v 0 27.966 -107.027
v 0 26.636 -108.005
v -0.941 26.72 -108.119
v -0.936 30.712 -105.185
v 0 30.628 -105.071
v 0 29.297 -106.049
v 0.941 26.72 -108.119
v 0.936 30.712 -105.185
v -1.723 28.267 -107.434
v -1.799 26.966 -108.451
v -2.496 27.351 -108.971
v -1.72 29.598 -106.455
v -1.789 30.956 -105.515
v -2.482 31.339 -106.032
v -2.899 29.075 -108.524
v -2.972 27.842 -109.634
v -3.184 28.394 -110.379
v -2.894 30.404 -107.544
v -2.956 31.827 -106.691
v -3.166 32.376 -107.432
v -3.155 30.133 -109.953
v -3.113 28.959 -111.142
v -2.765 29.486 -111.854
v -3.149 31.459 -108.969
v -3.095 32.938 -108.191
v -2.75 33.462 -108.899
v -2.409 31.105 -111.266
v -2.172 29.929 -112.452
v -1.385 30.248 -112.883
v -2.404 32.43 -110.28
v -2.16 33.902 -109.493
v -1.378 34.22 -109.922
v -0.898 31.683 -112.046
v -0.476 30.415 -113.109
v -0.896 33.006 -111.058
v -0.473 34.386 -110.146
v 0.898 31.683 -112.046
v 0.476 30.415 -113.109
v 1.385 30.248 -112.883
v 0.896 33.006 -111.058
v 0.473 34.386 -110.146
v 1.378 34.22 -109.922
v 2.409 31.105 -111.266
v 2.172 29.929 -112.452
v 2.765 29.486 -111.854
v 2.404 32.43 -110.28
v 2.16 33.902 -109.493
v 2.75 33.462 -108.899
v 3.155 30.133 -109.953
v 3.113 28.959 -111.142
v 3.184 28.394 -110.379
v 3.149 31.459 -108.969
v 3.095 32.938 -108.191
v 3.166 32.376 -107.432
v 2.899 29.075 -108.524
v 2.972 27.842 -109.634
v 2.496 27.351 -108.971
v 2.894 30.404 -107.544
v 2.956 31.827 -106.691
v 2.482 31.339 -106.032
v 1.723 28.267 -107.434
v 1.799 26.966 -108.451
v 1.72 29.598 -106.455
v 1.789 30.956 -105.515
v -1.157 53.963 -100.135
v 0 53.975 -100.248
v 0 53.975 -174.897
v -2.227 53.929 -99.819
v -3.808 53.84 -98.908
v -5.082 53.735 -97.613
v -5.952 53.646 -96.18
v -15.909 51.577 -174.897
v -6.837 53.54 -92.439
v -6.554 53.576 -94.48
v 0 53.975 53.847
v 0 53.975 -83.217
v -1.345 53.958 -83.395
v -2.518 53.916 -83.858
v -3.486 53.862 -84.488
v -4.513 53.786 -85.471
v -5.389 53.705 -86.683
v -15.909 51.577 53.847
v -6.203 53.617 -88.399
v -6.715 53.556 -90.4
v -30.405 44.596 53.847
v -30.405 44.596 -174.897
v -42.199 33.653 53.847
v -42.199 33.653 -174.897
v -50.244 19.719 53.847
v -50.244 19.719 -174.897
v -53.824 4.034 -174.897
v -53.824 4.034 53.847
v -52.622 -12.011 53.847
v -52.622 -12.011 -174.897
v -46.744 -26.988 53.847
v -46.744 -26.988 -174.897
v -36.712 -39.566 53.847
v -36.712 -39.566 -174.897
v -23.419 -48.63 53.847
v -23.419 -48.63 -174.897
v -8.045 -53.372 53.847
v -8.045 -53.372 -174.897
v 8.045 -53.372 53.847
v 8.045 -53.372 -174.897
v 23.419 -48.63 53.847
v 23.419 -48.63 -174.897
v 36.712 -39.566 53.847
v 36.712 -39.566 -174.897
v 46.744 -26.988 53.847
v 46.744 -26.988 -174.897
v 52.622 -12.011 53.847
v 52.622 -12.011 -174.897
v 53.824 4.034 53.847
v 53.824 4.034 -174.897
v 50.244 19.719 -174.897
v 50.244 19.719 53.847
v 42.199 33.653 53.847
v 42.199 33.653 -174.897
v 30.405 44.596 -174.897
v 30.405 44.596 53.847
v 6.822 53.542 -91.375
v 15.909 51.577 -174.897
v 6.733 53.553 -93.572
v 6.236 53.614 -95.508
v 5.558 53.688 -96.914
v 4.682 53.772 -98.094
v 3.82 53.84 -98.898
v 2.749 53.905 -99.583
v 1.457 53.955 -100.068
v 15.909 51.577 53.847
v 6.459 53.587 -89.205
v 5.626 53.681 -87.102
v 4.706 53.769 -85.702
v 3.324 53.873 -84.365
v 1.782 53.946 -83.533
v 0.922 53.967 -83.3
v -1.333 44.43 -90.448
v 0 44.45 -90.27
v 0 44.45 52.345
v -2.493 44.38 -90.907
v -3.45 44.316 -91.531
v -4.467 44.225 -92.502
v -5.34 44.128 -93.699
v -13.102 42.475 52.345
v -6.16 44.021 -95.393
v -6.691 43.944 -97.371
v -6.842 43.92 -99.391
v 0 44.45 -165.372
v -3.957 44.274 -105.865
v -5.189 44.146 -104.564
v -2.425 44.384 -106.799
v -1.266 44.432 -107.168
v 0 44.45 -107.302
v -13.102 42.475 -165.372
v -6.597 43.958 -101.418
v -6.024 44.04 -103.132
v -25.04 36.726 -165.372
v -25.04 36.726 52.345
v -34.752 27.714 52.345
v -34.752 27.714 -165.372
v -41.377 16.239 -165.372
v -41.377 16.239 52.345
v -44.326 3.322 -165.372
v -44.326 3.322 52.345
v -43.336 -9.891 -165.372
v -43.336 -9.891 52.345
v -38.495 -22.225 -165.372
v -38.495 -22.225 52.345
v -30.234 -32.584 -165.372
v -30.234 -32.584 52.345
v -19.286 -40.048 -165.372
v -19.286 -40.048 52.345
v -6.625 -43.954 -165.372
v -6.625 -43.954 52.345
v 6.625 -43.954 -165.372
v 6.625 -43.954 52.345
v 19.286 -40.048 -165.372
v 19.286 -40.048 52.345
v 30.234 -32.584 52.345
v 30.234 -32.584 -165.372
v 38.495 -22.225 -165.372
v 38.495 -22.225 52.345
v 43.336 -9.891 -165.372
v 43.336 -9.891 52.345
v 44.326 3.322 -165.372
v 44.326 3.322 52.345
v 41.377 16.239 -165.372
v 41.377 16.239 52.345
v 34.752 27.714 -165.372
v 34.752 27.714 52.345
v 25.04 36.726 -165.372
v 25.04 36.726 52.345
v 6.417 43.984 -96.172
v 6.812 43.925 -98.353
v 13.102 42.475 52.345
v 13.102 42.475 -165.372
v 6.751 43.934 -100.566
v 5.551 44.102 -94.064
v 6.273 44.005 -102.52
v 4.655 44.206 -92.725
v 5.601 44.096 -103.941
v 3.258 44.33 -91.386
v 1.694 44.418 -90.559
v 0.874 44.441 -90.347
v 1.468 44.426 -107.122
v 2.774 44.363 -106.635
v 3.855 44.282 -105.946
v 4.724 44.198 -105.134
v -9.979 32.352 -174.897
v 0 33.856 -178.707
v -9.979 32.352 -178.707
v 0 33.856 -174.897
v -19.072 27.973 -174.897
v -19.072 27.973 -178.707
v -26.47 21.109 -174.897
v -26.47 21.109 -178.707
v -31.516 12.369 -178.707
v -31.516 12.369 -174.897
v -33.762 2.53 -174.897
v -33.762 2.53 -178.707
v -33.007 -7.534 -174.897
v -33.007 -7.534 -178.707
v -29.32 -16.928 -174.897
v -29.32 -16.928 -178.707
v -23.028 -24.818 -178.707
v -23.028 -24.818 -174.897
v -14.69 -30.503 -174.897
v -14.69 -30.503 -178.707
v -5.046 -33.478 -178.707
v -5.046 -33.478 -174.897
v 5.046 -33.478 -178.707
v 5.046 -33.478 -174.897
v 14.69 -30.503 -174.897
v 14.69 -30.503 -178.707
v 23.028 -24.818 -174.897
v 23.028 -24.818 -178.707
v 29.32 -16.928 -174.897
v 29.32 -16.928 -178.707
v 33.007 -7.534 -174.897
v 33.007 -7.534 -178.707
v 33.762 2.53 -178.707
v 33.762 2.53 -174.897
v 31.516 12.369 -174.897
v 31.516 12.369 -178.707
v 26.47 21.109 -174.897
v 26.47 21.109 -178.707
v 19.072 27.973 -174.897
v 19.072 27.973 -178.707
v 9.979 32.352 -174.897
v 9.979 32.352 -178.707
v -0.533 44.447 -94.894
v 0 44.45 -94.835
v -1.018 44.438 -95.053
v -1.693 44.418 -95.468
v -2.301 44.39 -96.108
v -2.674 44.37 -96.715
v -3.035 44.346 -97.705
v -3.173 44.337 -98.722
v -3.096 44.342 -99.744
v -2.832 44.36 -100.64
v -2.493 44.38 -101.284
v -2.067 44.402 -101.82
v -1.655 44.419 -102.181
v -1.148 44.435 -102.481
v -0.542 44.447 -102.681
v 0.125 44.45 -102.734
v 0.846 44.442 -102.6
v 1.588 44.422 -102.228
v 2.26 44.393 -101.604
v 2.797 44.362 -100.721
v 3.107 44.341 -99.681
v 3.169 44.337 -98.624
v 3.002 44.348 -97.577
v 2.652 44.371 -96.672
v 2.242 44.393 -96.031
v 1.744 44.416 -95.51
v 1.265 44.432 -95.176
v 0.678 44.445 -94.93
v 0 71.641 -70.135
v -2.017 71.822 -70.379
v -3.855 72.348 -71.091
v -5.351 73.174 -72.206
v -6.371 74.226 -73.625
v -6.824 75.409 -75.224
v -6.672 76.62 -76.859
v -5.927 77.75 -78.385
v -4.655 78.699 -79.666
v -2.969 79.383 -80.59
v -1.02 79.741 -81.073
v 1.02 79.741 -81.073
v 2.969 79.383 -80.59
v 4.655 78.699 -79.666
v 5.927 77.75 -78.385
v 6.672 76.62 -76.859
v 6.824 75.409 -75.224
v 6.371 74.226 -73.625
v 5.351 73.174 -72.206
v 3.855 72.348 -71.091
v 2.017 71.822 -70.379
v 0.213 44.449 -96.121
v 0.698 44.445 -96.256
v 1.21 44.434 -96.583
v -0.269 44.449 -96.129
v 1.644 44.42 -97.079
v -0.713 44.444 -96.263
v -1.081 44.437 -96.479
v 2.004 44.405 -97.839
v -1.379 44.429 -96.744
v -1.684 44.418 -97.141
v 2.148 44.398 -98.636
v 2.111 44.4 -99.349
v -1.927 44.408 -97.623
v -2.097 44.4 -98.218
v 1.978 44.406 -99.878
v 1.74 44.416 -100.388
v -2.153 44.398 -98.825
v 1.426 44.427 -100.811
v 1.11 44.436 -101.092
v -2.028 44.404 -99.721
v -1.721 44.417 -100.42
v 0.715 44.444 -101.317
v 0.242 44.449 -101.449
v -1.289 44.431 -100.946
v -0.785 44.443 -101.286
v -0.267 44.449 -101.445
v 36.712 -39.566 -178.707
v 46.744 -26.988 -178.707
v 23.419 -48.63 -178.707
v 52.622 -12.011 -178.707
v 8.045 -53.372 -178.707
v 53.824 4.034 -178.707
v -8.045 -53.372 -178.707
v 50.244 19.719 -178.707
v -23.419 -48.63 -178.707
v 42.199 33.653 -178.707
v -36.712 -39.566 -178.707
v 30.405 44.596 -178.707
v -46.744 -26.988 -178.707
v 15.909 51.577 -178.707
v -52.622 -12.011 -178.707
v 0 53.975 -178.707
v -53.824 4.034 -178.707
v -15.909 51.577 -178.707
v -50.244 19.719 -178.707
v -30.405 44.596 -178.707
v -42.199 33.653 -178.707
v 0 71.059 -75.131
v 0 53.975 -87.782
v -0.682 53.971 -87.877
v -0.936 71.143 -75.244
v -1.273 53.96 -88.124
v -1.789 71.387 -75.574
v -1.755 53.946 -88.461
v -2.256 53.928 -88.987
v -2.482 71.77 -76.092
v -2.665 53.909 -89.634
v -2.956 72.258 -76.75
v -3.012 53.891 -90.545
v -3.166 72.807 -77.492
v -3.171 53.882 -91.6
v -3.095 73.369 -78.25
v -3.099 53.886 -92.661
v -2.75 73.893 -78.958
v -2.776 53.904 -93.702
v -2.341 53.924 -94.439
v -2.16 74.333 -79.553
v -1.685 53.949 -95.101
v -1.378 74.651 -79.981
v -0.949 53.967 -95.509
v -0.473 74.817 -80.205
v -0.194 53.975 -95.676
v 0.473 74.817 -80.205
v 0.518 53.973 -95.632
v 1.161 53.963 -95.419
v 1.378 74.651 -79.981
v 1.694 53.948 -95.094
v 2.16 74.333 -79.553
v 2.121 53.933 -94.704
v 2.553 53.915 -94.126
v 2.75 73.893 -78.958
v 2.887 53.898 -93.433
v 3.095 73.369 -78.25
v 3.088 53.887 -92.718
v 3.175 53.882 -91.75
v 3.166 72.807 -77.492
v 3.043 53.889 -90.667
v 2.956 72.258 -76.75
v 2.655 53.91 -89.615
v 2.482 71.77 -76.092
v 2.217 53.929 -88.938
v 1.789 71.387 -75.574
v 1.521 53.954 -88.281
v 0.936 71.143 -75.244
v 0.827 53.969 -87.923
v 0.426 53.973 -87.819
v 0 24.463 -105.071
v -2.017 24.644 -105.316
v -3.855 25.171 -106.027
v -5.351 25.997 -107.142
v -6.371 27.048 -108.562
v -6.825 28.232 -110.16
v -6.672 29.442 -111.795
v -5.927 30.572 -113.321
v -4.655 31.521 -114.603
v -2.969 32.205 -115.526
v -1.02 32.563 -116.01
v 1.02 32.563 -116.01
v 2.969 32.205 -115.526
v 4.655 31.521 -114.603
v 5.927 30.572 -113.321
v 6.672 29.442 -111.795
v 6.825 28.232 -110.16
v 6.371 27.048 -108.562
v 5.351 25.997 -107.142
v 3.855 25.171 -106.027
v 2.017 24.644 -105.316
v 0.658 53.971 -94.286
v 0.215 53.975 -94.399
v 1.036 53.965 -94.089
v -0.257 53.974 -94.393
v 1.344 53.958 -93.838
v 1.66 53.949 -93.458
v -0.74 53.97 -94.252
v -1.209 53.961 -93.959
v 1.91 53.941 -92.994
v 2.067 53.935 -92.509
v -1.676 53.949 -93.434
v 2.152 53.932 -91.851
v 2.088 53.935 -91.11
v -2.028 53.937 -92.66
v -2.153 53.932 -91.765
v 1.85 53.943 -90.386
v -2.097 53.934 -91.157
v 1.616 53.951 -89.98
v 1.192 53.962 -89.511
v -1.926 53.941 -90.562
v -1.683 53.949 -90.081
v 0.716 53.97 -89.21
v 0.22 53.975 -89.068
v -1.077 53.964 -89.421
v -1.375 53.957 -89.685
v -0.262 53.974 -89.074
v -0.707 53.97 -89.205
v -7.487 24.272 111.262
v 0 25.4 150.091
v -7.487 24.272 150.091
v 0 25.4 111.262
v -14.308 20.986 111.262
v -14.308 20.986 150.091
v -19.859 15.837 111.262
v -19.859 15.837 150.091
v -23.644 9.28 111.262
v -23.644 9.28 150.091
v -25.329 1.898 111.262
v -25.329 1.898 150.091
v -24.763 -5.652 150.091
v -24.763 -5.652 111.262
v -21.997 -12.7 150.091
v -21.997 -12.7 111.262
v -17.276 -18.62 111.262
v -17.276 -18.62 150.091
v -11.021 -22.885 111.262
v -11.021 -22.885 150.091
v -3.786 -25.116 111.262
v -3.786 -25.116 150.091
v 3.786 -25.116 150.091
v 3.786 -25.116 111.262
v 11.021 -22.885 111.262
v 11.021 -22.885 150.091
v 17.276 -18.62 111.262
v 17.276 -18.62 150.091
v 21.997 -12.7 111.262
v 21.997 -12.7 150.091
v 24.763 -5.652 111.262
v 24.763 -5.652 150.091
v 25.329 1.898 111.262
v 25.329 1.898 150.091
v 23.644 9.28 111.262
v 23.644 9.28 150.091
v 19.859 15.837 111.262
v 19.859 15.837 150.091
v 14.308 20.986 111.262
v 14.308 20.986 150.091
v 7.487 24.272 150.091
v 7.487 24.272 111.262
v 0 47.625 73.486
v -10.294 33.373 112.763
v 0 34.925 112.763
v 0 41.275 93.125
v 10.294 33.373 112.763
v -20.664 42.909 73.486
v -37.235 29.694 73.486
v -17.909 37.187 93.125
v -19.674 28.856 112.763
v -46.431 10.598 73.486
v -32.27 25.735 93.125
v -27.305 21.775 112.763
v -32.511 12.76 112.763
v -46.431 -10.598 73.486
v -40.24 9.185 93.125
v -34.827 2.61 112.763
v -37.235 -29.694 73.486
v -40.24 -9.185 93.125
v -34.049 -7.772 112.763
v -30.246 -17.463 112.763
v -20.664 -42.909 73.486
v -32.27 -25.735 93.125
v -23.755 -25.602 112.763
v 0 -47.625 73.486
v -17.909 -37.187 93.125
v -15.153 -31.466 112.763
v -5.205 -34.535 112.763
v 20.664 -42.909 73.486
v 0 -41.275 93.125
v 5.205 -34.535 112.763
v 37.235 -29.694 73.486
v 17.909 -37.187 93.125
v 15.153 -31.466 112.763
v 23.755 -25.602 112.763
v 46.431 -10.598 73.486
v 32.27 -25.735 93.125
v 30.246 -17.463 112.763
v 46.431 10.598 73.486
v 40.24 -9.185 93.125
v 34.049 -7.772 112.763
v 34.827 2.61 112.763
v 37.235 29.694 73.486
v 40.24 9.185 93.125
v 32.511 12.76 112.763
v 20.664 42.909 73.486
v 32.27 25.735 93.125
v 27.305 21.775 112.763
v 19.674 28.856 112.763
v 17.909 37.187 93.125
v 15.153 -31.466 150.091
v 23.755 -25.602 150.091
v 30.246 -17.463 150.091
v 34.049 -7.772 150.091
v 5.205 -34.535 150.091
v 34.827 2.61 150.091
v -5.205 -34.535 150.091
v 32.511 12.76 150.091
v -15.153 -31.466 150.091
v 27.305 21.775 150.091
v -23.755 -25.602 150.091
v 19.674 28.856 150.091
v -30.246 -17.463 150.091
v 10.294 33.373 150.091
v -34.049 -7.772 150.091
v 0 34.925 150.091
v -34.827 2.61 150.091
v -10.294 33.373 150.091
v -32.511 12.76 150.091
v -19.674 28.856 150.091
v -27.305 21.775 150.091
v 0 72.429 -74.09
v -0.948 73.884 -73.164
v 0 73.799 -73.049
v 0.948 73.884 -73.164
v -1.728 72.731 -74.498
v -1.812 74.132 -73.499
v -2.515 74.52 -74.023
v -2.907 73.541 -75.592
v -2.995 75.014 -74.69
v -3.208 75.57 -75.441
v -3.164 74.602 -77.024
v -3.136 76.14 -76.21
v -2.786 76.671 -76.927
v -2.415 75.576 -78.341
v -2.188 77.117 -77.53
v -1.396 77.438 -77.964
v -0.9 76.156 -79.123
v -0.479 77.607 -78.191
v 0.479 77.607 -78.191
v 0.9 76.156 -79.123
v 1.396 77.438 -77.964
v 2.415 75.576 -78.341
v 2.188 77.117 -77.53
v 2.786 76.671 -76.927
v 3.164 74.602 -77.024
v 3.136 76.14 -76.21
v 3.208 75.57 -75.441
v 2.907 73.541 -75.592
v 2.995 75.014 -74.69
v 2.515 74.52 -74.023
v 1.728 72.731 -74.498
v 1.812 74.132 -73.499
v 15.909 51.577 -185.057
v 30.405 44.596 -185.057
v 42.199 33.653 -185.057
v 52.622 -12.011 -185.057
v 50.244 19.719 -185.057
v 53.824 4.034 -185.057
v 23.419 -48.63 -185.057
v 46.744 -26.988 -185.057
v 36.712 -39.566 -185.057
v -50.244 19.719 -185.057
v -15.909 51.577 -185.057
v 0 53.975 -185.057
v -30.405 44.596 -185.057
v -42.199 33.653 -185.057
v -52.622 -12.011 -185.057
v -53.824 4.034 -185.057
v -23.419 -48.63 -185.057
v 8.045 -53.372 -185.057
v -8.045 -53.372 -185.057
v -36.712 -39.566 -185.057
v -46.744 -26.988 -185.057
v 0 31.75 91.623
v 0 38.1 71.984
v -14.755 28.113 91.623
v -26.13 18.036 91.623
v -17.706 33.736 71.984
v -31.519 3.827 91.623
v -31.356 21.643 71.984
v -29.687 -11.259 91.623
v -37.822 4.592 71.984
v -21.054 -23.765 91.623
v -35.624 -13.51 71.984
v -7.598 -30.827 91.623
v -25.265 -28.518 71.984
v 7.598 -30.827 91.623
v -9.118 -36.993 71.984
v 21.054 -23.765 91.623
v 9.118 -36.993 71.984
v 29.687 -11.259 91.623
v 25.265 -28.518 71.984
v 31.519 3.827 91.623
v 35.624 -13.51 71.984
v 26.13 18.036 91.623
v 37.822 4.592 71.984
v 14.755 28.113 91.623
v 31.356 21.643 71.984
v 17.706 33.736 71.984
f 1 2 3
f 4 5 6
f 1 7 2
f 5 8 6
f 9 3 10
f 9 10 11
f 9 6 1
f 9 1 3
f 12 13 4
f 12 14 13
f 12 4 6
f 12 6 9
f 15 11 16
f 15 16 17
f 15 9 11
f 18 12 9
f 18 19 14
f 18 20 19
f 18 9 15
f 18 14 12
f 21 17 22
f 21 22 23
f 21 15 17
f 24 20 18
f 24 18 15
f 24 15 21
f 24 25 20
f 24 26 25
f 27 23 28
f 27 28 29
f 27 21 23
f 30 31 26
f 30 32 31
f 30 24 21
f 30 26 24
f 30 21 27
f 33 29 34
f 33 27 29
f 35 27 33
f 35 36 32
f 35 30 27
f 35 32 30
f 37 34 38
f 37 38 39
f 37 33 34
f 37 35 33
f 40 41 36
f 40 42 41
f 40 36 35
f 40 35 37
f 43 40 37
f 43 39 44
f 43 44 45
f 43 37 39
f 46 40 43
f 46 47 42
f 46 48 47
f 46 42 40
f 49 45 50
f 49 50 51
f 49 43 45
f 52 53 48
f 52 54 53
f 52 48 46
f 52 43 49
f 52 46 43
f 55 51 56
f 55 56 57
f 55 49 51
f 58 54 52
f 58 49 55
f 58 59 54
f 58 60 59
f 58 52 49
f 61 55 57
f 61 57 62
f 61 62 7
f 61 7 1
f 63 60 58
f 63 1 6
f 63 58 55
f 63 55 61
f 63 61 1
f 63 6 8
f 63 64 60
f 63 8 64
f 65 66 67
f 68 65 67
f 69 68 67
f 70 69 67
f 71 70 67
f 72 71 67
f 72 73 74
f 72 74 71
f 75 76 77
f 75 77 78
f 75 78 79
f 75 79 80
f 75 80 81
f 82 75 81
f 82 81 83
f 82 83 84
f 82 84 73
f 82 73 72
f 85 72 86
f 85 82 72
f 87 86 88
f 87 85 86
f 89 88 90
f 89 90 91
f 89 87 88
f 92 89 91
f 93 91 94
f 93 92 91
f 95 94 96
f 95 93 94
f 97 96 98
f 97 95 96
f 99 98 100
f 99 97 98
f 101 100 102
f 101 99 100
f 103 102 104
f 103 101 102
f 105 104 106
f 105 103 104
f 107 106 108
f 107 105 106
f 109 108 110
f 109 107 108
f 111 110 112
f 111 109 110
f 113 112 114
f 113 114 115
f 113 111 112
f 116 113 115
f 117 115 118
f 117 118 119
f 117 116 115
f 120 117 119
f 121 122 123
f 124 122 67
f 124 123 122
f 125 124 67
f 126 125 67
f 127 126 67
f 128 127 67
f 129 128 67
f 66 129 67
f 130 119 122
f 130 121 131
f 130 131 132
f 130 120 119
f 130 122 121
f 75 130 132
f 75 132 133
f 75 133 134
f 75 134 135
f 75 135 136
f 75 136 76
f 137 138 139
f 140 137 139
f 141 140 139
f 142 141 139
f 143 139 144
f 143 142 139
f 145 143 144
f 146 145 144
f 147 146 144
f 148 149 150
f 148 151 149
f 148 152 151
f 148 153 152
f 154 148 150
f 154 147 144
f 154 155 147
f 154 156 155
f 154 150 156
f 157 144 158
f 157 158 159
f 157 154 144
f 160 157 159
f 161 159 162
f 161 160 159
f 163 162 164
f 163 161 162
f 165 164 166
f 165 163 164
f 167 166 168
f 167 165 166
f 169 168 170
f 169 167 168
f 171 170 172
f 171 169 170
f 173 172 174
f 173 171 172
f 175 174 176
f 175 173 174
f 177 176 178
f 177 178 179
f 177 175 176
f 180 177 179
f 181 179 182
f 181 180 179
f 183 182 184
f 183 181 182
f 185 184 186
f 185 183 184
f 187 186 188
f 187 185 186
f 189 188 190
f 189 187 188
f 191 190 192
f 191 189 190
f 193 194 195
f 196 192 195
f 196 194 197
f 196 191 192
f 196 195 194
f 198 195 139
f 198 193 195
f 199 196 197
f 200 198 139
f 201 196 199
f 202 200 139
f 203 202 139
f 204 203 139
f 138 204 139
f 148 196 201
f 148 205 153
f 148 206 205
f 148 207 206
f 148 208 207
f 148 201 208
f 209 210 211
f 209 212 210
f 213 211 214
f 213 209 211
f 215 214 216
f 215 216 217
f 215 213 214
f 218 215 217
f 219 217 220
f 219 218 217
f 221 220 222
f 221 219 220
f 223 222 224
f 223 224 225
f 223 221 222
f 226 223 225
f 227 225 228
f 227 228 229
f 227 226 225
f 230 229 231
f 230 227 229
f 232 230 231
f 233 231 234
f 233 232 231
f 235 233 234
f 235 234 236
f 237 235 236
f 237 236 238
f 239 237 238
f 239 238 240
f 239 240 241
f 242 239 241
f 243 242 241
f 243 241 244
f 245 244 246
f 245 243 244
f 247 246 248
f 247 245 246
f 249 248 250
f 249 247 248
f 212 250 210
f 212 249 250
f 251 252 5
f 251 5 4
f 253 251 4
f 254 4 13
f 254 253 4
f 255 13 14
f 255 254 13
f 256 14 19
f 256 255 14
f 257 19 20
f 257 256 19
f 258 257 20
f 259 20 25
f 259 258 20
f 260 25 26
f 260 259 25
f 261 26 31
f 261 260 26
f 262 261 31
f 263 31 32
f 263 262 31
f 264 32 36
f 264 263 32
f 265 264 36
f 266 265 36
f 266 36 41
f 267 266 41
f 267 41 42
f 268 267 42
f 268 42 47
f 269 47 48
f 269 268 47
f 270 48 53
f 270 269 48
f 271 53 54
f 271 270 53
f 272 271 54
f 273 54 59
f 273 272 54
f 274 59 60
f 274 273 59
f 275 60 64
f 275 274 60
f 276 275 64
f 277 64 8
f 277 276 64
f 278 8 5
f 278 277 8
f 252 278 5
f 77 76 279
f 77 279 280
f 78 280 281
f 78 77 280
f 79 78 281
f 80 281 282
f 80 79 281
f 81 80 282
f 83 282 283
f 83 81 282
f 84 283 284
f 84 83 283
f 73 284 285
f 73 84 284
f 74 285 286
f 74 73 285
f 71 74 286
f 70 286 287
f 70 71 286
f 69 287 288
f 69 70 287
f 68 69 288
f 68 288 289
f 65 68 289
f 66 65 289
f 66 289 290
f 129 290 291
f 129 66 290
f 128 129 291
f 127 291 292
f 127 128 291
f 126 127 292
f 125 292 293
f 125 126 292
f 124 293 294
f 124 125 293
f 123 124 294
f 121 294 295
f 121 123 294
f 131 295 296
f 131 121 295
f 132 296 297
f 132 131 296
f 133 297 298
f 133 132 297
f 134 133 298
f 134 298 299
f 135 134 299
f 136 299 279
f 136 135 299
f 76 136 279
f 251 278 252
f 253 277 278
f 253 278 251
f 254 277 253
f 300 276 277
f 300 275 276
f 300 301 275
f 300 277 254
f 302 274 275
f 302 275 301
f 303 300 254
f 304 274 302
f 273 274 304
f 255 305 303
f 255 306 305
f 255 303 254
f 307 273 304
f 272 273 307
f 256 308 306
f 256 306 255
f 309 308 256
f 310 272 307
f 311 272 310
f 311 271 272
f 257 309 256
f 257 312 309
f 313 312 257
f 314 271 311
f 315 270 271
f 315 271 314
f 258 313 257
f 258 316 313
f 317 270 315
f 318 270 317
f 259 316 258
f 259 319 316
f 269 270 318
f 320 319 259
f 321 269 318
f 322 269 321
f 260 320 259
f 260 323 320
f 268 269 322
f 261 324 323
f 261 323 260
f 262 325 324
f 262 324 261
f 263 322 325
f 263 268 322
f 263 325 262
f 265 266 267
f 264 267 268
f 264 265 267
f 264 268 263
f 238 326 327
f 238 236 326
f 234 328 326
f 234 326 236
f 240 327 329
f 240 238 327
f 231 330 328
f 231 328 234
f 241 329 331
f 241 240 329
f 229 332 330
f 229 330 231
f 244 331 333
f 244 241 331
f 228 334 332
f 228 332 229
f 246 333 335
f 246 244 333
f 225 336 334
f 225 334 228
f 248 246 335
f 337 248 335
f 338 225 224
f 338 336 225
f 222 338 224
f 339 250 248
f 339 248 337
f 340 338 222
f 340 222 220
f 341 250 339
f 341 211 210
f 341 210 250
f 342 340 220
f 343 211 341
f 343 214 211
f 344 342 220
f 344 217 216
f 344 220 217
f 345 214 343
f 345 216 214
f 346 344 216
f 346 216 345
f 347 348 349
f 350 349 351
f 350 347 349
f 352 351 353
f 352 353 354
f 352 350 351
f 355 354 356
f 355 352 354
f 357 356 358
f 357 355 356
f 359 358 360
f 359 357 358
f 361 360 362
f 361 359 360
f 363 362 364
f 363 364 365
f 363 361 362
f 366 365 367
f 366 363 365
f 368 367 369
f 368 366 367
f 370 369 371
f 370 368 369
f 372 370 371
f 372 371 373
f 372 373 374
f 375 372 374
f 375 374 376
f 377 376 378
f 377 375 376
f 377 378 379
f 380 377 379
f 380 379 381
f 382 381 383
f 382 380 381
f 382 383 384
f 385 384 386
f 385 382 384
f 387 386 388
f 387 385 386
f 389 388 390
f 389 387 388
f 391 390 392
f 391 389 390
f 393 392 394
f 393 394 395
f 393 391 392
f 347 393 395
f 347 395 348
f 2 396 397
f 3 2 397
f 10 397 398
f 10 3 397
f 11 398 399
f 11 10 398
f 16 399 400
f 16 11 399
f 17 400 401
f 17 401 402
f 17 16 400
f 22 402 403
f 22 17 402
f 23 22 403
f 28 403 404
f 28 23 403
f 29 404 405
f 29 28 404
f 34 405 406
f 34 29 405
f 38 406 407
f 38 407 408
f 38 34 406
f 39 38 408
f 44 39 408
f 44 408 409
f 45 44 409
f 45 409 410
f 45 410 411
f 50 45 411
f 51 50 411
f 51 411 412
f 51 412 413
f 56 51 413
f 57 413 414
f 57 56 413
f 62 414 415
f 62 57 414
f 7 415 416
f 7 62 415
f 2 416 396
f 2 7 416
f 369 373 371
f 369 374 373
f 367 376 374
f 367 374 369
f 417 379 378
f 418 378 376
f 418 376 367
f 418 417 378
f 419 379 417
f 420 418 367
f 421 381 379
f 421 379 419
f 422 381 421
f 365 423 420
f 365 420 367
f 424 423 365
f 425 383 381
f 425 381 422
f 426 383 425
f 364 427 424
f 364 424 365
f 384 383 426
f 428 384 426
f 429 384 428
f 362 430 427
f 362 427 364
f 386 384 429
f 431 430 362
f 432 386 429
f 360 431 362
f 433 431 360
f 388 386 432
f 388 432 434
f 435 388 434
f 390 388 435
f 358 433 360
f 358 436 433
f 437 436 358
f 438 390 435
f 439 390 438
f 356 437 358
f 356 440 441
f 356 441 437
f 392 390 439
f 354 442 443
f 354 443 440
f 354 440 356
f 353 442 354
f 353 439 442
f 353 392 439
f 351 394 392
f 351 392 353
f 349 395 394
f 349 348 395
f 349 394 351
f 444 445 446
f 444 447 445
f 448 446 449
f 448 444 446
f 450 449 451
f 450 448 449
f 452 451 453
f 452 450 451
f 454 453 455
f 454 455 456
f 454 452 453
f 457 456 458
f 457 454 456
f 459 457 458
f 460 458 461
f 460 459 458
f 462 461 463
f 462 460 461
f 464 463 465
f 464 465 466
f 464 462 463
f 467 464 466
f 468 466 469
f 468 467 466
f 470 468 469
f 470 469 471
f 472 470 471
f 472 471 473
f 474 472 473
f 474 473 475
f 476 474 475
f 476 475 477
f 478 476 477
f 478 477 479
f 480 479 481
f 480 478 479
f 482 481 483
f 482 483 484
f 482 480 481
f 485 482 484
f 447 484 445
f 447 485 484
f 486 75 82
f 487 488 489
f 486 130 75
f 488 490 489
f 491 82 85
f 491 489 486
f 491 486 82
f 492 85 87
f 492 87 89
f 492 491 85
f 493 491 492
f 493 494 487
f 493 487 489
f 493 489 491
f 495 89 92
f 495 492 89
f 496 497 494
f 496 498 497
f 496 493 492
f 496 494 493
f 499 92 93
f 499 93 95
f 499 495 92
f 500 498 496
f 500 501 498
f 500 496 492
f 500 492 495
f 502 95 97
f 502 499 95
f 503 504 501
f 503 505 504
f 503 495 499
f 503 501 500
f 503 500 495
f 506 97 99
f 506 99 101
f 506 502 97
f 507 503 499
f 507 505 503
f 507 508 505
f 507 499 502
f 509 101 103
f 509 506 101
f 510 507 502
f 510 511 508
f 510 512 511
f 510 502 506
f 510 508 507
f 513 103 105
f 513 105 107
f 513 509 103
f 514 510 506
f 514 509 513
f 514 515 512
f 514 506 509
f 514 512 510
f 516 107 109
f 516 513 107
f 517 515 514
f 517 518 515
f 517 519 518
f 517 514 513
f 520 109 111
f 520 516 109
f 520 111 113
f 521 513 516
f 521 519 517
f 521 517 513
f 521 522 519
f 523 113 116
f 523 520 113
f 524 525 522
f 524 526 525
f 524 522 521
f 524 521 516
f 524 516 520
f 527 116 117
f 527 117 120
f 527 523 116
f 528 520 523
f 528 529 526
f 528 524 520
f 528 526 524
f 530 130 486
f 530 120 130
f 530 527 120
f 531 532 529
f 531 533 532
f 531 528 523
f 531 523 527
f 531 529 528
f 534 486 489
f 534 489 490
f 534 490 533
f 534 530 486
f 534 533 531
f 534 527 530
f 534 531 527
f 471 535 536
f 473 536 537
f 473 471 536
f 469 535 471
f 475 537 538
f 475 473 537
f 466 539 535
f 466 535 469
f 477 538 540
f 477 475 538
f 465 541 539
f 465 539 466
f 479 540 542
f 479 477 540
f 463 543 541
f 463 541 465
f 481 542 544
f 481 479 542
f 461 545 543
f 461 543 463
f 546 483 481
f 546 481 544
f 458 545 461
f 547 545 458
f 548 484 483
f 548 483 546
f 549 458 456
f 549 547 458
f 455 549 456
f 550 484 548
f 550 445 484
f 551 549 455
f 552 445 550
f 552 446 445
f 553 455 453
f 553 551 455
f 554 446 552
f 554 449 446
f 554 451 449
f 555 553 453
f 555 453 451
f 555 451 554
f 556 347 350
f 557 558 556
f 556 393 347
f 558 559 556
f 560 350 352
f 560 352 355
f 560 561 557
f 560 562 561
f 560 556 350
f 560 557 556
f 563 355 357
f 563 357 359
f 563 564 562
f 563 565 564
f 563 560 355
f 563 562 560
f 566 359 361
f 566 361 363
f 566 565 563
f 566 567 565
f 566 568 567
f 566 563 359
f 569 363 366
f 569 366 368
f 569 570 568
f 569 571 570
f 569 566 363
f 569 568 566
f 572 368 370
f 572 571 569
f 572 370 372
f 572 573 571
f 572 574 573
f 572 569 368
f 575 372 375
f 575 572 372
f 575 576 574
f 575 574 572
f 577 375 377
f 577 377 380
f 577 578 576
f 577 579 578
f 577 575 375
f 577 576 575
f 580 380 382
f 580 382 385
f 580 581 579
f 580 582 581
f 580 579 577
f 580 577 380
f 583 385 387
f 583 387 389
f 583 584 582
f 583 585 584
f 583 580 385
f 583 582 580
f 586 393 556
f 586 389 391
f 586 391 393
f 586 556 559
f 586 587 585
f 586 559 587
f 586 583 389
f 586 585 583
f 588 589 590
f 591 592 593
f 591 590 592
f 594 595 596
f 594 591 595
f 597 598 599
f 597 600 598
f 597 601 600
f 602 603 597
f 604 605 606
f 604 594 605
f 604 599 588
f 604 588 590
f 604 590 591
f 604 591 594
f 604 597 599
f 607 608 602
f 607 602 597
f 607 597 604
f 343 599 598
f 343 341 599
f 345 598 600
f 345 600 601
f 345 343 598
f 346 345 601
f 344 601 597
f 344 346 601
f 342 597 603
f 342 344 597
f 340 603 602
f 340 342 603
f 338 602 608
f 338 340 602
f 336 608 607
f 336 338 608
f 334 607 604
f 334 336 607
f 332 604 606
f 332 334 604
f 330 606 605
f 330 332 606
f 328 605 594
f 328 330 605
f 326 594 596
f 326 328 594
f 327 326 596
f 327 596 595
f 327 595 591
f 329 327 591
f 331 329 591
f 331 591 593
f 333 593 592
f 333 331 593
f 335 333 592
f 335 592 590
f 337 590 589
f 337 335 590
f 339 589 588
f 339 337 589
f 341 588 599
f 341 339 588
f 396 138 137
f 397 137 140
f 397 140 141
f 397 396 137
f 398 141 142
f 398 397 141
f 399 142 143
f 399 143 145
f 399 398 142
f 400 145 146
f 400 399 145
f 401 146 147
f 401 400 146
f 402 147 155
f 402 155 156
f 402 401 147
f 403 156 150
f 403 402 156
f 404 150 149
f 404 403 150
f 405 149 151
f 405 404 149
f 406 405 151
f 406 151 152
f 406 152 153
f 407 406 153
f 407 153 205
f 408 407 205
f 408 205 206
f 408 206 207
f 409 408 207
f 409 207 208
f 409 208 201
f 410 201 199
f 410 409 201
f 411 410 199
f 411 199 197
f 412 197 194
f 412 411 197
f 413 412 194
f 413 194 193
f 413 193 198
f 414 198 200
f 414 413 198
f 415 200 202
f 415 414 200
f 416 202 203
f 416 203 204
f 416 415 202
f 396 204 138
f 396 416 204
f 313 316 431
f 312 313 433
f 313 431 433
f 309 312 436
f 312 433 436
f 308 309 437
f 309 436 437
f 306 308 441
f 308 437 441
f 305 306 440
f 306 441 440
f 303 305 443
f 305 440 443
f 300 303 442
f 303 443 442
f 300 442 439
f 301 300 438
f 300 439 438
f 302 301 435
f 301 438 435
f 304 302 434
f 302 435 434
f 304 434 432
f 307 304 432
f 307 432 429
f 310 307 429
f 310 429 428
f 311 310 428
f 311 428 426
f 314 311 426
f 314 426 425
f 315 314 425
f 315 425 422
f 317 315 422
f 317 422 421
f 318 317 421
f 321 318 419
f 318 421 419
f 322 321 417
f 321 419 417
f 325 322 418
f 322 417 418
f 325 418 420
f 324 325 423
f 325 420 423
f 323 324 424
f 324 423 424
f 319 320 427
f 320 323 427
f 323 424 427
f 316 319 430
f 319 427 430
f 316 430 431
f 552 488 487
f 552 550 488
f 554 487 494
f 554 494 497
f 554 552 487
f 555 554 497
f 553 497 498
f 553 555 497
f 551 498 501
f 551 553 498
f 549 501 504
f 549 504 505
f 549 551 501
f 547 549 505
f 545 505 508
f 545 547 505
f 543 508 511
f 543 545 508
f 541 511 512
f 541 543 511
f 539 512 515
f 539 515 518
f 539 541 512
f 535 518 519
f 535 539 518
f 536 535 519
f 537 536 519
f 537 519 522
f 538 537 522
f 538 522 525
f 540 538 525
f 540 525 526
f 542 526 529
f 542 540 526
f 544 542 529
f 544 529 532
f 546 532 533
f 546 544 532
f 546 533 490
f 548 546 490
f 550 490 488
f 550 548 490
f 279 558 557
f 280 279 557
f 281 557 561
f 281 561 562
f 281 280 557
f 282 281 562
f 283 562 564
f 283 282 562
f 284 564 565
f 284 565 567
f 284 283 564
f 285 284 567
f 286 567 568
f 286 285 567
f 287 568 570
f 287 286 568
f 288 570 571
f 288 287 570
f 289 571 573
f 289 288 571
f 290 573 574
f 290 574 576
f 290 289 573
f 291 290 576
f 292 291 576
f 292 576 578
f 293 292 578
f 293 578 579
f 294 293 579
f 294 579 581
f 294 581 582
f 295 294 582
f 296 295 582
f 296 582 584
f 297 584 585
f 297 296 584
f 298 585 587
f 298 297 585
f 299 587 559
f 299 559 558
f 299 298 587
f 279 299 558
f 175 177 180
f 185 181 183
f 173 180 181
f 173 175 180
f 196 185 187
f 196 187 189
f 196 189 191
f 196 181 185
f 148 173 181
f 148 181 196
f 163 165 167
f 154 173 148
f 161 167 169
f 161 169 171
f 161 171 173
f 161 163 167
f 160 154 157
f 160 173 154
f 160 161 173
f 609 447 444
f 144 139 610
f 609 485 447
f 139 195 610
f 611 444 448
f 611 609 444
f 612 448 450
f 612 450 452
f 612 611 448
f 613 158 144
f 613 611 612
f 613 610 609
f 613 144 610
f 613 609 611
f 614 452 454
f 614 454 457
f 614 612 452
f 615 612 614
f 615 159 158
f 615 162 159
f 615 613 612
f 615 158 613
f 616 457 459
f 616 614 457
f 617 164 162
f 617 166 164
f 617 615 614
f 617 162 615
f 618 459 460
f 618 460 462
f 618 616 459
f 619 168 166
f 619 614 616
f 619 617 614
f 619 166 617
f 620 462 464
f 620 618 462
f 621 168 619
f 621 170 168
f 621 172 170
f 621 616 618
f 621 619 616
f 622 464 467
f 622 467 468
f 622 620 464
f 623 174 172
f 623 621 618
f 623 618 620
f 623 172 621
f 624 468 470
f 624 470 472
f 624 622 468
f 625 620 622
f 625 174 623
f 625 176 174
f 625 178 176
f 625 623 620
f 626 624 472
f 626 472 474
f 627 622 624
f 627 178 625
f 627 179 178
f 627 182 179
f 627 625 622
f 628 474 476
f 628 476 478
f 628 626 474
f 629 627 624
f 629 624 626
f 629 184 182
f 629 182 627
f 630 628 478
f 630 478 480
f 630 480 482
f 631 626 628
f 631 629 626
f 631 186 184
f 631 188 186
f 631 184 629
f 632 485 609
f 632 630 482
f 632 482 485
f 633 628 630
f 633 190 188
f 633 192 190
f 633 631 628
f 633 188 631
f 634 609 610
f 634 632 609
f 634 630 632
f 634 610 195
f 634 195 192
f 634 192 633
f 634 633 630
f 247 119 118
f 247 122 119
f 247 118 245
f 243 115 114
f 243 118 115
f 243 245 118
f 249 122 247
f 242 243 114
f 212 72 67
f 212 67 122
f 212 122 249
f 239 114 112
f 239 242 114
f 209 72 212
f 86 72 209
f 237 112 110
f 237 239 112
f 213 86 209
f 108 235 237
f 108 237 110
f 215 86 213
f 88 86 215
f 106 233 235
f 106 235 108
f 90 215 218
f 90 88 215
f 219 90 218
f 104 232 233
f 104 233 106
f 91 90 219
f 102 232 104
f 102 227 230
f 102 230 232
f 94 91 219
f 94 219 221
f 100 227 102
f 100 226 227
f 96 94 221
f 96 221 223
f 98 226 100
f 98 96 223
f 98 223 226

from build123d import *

# Parameters (mm, degrees)
F4_R     = 2.152954
F5_DEPTH = 50.8


with BuildPart() as f1:
    # F0 (on Right) → F1 (revolve)
    with BuildSketch(Plane.YZ):
        Polygon((0, -174.897112), (0, -185.057112), (53.975, -185.057112), (53.975, -178.707112), (33.856217, -178.707112), (33.856217, -174.897112), align=None)
        Polygon((0, -165.372112), (0, -174.897112), (33.856217, -174.897112), (44.45, -165.372112), align=None)
        Polygon((44.45, -165.372112), (33.856217, -174.897112), (53.975, -174.897112), (53.975, 53.846701), (34.925, 112.763417), (34.925, 150.090903), (25.4, 150.090903), (25.4, 111.261793), (44.45, 52.345077), align=None)
    revolve(axis=Axis((0, 0, 8.948858), (0, 0, 1)))

    # F2 (on Right) → F3 (revolve)
    with BuildSketch(Plane.YZ):
        Polygon((71.640717, -70.134891), (24.463108, -105.071298), (26.635614, -108.005017), (30.627662, -105.071298), (71.058815, -75.13084), (73.798926, -73.049305), align=None)
    revolve(axis=Axis((0, 52.4091, -92.892285), (0, -0.803638, -0.595118)))

    # F4 (on face) → F5 (cut)
    with BuildSketch(Plane(origin=(0, 12.725377, 9.423516), x_dir=(-1, 0, 0), z_dir=(0, 0.803638, 0.595118))):
        with Locations((0, -105.841401)):
            Circle(F4_R)
    extrude(amount=-F5_DEPTH, mode=Mode.SUBTRACT)


solid = f1.part
